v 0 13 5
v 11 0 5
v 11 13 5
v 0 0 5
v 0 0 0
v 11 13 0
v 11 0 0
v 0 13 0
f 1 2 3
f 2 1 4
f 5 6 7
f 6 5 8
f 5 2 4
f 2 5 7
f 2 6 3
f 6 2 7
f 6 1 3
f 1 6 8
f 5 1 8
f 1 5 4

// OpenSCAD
// Generated by SolidPython 1.0.1 on 2020-07-29 00:46:55


cube(size = [11, 13, 5]);
/***********************************************
*********      SolidPython code:      **********
************************************************
 
# import packages: SolidPython
from solid import *
from solid.utils import *
from itertools import chain, combinations, permutations


class Resize:

    def __init__(self, scad_file):
        self.scad_file = scad_file
        #self.scad_file = import_scad(scad_file)
        # cone/cylinder param:
        self.r1 = 0
        self.r2 = 0
        self.h = 0
        # rectangular prism param:
        self.w = 0
        self.l = 0
        # ellipse param:
        self.r = 0

    # import OpenScad code (file name corresponds to shape)


    # classify shape + parameters
    def assign(self, param1, param2, param3):
        if self.scad_file == 'cone.scad':
            self.r1 = param1
            self.r2 = param2
            self.h = param3
        elif self.scad_file == 'cylinder.scad':
            self.r1 = param1
            self.r2 = param2
            self.h = param3
        elif self.scad_file == 'rectangularPrism.scad':
            self.h = param1
            self.l = param2
            self.w = param3
        else:
            self.r = param1
            self.h = param2

    # resize parameters
    def iterate(self):
        x = range(3, 20, 2)
        i = 1
        if self.scad_file == 'cone.scad':
            tempList = list(permutations(x, 2))
            for temp in tempList:
                param1 = temp[0]
                param2 = temp[1]
                filepath = 'produced_scad_files/' + 'cone' + str(param1) + '_' + str(param2) + '_' + '.scad'
                scad_render_to_file(cylinder(h=param1, r1=param2, r2=0), filepath)

        elif self.scad_file == 'cylinder.scad':
            tempList = list(permutations(x, 3))
            for temp in tempList:
                param1 = temp[0]
                param2 = temp[1]
                filepath = 'produced_scad_files/' + 'cylinder' + str(param1) + '_' + str(param2) + '_' + '.scad'
                scad_render_to_file(cylinder(h=param1, r1=param2, r2=param2), filepath)

        elif self.scad_file == 'rectangularPrism.scad':
            tempList = list(permutations(x, 3))
            for temp in tempList:
                param1 = temp[0]
                param2 = temp[1]
                param3 = temp[2]
                filepath = 'produced_scad_files/' + 'rectangularPrism' + str(param1) + '_' + str(param2) + '_' + str(
                    param3) + '.scad'
                scad_render_to_file(cube(size=(param1, param2, param3)), filepath)

        elif self.scad_file == 'ellipse.scad':
            tempList = list(permutations(x, 4))
            for temp in tempList:
                param1 = temp[0]
                param2 = temp[1]
                param3 = temp[2]
                param4 = temp[3]
                filepath = 'produced_scad_files/' + 'ellipse' + str(param1) + '_' + str(param2) + '_' + str(param3) + '_' + str(param4) + '.scad'
                scad_render_to_file(scale([param1, param2, param3])(sphere(r=param4)), filepath)

    def render_to_scadfile(self):
        scad_render_to_file(scad, 'example.scad') 
 
************************************************/
